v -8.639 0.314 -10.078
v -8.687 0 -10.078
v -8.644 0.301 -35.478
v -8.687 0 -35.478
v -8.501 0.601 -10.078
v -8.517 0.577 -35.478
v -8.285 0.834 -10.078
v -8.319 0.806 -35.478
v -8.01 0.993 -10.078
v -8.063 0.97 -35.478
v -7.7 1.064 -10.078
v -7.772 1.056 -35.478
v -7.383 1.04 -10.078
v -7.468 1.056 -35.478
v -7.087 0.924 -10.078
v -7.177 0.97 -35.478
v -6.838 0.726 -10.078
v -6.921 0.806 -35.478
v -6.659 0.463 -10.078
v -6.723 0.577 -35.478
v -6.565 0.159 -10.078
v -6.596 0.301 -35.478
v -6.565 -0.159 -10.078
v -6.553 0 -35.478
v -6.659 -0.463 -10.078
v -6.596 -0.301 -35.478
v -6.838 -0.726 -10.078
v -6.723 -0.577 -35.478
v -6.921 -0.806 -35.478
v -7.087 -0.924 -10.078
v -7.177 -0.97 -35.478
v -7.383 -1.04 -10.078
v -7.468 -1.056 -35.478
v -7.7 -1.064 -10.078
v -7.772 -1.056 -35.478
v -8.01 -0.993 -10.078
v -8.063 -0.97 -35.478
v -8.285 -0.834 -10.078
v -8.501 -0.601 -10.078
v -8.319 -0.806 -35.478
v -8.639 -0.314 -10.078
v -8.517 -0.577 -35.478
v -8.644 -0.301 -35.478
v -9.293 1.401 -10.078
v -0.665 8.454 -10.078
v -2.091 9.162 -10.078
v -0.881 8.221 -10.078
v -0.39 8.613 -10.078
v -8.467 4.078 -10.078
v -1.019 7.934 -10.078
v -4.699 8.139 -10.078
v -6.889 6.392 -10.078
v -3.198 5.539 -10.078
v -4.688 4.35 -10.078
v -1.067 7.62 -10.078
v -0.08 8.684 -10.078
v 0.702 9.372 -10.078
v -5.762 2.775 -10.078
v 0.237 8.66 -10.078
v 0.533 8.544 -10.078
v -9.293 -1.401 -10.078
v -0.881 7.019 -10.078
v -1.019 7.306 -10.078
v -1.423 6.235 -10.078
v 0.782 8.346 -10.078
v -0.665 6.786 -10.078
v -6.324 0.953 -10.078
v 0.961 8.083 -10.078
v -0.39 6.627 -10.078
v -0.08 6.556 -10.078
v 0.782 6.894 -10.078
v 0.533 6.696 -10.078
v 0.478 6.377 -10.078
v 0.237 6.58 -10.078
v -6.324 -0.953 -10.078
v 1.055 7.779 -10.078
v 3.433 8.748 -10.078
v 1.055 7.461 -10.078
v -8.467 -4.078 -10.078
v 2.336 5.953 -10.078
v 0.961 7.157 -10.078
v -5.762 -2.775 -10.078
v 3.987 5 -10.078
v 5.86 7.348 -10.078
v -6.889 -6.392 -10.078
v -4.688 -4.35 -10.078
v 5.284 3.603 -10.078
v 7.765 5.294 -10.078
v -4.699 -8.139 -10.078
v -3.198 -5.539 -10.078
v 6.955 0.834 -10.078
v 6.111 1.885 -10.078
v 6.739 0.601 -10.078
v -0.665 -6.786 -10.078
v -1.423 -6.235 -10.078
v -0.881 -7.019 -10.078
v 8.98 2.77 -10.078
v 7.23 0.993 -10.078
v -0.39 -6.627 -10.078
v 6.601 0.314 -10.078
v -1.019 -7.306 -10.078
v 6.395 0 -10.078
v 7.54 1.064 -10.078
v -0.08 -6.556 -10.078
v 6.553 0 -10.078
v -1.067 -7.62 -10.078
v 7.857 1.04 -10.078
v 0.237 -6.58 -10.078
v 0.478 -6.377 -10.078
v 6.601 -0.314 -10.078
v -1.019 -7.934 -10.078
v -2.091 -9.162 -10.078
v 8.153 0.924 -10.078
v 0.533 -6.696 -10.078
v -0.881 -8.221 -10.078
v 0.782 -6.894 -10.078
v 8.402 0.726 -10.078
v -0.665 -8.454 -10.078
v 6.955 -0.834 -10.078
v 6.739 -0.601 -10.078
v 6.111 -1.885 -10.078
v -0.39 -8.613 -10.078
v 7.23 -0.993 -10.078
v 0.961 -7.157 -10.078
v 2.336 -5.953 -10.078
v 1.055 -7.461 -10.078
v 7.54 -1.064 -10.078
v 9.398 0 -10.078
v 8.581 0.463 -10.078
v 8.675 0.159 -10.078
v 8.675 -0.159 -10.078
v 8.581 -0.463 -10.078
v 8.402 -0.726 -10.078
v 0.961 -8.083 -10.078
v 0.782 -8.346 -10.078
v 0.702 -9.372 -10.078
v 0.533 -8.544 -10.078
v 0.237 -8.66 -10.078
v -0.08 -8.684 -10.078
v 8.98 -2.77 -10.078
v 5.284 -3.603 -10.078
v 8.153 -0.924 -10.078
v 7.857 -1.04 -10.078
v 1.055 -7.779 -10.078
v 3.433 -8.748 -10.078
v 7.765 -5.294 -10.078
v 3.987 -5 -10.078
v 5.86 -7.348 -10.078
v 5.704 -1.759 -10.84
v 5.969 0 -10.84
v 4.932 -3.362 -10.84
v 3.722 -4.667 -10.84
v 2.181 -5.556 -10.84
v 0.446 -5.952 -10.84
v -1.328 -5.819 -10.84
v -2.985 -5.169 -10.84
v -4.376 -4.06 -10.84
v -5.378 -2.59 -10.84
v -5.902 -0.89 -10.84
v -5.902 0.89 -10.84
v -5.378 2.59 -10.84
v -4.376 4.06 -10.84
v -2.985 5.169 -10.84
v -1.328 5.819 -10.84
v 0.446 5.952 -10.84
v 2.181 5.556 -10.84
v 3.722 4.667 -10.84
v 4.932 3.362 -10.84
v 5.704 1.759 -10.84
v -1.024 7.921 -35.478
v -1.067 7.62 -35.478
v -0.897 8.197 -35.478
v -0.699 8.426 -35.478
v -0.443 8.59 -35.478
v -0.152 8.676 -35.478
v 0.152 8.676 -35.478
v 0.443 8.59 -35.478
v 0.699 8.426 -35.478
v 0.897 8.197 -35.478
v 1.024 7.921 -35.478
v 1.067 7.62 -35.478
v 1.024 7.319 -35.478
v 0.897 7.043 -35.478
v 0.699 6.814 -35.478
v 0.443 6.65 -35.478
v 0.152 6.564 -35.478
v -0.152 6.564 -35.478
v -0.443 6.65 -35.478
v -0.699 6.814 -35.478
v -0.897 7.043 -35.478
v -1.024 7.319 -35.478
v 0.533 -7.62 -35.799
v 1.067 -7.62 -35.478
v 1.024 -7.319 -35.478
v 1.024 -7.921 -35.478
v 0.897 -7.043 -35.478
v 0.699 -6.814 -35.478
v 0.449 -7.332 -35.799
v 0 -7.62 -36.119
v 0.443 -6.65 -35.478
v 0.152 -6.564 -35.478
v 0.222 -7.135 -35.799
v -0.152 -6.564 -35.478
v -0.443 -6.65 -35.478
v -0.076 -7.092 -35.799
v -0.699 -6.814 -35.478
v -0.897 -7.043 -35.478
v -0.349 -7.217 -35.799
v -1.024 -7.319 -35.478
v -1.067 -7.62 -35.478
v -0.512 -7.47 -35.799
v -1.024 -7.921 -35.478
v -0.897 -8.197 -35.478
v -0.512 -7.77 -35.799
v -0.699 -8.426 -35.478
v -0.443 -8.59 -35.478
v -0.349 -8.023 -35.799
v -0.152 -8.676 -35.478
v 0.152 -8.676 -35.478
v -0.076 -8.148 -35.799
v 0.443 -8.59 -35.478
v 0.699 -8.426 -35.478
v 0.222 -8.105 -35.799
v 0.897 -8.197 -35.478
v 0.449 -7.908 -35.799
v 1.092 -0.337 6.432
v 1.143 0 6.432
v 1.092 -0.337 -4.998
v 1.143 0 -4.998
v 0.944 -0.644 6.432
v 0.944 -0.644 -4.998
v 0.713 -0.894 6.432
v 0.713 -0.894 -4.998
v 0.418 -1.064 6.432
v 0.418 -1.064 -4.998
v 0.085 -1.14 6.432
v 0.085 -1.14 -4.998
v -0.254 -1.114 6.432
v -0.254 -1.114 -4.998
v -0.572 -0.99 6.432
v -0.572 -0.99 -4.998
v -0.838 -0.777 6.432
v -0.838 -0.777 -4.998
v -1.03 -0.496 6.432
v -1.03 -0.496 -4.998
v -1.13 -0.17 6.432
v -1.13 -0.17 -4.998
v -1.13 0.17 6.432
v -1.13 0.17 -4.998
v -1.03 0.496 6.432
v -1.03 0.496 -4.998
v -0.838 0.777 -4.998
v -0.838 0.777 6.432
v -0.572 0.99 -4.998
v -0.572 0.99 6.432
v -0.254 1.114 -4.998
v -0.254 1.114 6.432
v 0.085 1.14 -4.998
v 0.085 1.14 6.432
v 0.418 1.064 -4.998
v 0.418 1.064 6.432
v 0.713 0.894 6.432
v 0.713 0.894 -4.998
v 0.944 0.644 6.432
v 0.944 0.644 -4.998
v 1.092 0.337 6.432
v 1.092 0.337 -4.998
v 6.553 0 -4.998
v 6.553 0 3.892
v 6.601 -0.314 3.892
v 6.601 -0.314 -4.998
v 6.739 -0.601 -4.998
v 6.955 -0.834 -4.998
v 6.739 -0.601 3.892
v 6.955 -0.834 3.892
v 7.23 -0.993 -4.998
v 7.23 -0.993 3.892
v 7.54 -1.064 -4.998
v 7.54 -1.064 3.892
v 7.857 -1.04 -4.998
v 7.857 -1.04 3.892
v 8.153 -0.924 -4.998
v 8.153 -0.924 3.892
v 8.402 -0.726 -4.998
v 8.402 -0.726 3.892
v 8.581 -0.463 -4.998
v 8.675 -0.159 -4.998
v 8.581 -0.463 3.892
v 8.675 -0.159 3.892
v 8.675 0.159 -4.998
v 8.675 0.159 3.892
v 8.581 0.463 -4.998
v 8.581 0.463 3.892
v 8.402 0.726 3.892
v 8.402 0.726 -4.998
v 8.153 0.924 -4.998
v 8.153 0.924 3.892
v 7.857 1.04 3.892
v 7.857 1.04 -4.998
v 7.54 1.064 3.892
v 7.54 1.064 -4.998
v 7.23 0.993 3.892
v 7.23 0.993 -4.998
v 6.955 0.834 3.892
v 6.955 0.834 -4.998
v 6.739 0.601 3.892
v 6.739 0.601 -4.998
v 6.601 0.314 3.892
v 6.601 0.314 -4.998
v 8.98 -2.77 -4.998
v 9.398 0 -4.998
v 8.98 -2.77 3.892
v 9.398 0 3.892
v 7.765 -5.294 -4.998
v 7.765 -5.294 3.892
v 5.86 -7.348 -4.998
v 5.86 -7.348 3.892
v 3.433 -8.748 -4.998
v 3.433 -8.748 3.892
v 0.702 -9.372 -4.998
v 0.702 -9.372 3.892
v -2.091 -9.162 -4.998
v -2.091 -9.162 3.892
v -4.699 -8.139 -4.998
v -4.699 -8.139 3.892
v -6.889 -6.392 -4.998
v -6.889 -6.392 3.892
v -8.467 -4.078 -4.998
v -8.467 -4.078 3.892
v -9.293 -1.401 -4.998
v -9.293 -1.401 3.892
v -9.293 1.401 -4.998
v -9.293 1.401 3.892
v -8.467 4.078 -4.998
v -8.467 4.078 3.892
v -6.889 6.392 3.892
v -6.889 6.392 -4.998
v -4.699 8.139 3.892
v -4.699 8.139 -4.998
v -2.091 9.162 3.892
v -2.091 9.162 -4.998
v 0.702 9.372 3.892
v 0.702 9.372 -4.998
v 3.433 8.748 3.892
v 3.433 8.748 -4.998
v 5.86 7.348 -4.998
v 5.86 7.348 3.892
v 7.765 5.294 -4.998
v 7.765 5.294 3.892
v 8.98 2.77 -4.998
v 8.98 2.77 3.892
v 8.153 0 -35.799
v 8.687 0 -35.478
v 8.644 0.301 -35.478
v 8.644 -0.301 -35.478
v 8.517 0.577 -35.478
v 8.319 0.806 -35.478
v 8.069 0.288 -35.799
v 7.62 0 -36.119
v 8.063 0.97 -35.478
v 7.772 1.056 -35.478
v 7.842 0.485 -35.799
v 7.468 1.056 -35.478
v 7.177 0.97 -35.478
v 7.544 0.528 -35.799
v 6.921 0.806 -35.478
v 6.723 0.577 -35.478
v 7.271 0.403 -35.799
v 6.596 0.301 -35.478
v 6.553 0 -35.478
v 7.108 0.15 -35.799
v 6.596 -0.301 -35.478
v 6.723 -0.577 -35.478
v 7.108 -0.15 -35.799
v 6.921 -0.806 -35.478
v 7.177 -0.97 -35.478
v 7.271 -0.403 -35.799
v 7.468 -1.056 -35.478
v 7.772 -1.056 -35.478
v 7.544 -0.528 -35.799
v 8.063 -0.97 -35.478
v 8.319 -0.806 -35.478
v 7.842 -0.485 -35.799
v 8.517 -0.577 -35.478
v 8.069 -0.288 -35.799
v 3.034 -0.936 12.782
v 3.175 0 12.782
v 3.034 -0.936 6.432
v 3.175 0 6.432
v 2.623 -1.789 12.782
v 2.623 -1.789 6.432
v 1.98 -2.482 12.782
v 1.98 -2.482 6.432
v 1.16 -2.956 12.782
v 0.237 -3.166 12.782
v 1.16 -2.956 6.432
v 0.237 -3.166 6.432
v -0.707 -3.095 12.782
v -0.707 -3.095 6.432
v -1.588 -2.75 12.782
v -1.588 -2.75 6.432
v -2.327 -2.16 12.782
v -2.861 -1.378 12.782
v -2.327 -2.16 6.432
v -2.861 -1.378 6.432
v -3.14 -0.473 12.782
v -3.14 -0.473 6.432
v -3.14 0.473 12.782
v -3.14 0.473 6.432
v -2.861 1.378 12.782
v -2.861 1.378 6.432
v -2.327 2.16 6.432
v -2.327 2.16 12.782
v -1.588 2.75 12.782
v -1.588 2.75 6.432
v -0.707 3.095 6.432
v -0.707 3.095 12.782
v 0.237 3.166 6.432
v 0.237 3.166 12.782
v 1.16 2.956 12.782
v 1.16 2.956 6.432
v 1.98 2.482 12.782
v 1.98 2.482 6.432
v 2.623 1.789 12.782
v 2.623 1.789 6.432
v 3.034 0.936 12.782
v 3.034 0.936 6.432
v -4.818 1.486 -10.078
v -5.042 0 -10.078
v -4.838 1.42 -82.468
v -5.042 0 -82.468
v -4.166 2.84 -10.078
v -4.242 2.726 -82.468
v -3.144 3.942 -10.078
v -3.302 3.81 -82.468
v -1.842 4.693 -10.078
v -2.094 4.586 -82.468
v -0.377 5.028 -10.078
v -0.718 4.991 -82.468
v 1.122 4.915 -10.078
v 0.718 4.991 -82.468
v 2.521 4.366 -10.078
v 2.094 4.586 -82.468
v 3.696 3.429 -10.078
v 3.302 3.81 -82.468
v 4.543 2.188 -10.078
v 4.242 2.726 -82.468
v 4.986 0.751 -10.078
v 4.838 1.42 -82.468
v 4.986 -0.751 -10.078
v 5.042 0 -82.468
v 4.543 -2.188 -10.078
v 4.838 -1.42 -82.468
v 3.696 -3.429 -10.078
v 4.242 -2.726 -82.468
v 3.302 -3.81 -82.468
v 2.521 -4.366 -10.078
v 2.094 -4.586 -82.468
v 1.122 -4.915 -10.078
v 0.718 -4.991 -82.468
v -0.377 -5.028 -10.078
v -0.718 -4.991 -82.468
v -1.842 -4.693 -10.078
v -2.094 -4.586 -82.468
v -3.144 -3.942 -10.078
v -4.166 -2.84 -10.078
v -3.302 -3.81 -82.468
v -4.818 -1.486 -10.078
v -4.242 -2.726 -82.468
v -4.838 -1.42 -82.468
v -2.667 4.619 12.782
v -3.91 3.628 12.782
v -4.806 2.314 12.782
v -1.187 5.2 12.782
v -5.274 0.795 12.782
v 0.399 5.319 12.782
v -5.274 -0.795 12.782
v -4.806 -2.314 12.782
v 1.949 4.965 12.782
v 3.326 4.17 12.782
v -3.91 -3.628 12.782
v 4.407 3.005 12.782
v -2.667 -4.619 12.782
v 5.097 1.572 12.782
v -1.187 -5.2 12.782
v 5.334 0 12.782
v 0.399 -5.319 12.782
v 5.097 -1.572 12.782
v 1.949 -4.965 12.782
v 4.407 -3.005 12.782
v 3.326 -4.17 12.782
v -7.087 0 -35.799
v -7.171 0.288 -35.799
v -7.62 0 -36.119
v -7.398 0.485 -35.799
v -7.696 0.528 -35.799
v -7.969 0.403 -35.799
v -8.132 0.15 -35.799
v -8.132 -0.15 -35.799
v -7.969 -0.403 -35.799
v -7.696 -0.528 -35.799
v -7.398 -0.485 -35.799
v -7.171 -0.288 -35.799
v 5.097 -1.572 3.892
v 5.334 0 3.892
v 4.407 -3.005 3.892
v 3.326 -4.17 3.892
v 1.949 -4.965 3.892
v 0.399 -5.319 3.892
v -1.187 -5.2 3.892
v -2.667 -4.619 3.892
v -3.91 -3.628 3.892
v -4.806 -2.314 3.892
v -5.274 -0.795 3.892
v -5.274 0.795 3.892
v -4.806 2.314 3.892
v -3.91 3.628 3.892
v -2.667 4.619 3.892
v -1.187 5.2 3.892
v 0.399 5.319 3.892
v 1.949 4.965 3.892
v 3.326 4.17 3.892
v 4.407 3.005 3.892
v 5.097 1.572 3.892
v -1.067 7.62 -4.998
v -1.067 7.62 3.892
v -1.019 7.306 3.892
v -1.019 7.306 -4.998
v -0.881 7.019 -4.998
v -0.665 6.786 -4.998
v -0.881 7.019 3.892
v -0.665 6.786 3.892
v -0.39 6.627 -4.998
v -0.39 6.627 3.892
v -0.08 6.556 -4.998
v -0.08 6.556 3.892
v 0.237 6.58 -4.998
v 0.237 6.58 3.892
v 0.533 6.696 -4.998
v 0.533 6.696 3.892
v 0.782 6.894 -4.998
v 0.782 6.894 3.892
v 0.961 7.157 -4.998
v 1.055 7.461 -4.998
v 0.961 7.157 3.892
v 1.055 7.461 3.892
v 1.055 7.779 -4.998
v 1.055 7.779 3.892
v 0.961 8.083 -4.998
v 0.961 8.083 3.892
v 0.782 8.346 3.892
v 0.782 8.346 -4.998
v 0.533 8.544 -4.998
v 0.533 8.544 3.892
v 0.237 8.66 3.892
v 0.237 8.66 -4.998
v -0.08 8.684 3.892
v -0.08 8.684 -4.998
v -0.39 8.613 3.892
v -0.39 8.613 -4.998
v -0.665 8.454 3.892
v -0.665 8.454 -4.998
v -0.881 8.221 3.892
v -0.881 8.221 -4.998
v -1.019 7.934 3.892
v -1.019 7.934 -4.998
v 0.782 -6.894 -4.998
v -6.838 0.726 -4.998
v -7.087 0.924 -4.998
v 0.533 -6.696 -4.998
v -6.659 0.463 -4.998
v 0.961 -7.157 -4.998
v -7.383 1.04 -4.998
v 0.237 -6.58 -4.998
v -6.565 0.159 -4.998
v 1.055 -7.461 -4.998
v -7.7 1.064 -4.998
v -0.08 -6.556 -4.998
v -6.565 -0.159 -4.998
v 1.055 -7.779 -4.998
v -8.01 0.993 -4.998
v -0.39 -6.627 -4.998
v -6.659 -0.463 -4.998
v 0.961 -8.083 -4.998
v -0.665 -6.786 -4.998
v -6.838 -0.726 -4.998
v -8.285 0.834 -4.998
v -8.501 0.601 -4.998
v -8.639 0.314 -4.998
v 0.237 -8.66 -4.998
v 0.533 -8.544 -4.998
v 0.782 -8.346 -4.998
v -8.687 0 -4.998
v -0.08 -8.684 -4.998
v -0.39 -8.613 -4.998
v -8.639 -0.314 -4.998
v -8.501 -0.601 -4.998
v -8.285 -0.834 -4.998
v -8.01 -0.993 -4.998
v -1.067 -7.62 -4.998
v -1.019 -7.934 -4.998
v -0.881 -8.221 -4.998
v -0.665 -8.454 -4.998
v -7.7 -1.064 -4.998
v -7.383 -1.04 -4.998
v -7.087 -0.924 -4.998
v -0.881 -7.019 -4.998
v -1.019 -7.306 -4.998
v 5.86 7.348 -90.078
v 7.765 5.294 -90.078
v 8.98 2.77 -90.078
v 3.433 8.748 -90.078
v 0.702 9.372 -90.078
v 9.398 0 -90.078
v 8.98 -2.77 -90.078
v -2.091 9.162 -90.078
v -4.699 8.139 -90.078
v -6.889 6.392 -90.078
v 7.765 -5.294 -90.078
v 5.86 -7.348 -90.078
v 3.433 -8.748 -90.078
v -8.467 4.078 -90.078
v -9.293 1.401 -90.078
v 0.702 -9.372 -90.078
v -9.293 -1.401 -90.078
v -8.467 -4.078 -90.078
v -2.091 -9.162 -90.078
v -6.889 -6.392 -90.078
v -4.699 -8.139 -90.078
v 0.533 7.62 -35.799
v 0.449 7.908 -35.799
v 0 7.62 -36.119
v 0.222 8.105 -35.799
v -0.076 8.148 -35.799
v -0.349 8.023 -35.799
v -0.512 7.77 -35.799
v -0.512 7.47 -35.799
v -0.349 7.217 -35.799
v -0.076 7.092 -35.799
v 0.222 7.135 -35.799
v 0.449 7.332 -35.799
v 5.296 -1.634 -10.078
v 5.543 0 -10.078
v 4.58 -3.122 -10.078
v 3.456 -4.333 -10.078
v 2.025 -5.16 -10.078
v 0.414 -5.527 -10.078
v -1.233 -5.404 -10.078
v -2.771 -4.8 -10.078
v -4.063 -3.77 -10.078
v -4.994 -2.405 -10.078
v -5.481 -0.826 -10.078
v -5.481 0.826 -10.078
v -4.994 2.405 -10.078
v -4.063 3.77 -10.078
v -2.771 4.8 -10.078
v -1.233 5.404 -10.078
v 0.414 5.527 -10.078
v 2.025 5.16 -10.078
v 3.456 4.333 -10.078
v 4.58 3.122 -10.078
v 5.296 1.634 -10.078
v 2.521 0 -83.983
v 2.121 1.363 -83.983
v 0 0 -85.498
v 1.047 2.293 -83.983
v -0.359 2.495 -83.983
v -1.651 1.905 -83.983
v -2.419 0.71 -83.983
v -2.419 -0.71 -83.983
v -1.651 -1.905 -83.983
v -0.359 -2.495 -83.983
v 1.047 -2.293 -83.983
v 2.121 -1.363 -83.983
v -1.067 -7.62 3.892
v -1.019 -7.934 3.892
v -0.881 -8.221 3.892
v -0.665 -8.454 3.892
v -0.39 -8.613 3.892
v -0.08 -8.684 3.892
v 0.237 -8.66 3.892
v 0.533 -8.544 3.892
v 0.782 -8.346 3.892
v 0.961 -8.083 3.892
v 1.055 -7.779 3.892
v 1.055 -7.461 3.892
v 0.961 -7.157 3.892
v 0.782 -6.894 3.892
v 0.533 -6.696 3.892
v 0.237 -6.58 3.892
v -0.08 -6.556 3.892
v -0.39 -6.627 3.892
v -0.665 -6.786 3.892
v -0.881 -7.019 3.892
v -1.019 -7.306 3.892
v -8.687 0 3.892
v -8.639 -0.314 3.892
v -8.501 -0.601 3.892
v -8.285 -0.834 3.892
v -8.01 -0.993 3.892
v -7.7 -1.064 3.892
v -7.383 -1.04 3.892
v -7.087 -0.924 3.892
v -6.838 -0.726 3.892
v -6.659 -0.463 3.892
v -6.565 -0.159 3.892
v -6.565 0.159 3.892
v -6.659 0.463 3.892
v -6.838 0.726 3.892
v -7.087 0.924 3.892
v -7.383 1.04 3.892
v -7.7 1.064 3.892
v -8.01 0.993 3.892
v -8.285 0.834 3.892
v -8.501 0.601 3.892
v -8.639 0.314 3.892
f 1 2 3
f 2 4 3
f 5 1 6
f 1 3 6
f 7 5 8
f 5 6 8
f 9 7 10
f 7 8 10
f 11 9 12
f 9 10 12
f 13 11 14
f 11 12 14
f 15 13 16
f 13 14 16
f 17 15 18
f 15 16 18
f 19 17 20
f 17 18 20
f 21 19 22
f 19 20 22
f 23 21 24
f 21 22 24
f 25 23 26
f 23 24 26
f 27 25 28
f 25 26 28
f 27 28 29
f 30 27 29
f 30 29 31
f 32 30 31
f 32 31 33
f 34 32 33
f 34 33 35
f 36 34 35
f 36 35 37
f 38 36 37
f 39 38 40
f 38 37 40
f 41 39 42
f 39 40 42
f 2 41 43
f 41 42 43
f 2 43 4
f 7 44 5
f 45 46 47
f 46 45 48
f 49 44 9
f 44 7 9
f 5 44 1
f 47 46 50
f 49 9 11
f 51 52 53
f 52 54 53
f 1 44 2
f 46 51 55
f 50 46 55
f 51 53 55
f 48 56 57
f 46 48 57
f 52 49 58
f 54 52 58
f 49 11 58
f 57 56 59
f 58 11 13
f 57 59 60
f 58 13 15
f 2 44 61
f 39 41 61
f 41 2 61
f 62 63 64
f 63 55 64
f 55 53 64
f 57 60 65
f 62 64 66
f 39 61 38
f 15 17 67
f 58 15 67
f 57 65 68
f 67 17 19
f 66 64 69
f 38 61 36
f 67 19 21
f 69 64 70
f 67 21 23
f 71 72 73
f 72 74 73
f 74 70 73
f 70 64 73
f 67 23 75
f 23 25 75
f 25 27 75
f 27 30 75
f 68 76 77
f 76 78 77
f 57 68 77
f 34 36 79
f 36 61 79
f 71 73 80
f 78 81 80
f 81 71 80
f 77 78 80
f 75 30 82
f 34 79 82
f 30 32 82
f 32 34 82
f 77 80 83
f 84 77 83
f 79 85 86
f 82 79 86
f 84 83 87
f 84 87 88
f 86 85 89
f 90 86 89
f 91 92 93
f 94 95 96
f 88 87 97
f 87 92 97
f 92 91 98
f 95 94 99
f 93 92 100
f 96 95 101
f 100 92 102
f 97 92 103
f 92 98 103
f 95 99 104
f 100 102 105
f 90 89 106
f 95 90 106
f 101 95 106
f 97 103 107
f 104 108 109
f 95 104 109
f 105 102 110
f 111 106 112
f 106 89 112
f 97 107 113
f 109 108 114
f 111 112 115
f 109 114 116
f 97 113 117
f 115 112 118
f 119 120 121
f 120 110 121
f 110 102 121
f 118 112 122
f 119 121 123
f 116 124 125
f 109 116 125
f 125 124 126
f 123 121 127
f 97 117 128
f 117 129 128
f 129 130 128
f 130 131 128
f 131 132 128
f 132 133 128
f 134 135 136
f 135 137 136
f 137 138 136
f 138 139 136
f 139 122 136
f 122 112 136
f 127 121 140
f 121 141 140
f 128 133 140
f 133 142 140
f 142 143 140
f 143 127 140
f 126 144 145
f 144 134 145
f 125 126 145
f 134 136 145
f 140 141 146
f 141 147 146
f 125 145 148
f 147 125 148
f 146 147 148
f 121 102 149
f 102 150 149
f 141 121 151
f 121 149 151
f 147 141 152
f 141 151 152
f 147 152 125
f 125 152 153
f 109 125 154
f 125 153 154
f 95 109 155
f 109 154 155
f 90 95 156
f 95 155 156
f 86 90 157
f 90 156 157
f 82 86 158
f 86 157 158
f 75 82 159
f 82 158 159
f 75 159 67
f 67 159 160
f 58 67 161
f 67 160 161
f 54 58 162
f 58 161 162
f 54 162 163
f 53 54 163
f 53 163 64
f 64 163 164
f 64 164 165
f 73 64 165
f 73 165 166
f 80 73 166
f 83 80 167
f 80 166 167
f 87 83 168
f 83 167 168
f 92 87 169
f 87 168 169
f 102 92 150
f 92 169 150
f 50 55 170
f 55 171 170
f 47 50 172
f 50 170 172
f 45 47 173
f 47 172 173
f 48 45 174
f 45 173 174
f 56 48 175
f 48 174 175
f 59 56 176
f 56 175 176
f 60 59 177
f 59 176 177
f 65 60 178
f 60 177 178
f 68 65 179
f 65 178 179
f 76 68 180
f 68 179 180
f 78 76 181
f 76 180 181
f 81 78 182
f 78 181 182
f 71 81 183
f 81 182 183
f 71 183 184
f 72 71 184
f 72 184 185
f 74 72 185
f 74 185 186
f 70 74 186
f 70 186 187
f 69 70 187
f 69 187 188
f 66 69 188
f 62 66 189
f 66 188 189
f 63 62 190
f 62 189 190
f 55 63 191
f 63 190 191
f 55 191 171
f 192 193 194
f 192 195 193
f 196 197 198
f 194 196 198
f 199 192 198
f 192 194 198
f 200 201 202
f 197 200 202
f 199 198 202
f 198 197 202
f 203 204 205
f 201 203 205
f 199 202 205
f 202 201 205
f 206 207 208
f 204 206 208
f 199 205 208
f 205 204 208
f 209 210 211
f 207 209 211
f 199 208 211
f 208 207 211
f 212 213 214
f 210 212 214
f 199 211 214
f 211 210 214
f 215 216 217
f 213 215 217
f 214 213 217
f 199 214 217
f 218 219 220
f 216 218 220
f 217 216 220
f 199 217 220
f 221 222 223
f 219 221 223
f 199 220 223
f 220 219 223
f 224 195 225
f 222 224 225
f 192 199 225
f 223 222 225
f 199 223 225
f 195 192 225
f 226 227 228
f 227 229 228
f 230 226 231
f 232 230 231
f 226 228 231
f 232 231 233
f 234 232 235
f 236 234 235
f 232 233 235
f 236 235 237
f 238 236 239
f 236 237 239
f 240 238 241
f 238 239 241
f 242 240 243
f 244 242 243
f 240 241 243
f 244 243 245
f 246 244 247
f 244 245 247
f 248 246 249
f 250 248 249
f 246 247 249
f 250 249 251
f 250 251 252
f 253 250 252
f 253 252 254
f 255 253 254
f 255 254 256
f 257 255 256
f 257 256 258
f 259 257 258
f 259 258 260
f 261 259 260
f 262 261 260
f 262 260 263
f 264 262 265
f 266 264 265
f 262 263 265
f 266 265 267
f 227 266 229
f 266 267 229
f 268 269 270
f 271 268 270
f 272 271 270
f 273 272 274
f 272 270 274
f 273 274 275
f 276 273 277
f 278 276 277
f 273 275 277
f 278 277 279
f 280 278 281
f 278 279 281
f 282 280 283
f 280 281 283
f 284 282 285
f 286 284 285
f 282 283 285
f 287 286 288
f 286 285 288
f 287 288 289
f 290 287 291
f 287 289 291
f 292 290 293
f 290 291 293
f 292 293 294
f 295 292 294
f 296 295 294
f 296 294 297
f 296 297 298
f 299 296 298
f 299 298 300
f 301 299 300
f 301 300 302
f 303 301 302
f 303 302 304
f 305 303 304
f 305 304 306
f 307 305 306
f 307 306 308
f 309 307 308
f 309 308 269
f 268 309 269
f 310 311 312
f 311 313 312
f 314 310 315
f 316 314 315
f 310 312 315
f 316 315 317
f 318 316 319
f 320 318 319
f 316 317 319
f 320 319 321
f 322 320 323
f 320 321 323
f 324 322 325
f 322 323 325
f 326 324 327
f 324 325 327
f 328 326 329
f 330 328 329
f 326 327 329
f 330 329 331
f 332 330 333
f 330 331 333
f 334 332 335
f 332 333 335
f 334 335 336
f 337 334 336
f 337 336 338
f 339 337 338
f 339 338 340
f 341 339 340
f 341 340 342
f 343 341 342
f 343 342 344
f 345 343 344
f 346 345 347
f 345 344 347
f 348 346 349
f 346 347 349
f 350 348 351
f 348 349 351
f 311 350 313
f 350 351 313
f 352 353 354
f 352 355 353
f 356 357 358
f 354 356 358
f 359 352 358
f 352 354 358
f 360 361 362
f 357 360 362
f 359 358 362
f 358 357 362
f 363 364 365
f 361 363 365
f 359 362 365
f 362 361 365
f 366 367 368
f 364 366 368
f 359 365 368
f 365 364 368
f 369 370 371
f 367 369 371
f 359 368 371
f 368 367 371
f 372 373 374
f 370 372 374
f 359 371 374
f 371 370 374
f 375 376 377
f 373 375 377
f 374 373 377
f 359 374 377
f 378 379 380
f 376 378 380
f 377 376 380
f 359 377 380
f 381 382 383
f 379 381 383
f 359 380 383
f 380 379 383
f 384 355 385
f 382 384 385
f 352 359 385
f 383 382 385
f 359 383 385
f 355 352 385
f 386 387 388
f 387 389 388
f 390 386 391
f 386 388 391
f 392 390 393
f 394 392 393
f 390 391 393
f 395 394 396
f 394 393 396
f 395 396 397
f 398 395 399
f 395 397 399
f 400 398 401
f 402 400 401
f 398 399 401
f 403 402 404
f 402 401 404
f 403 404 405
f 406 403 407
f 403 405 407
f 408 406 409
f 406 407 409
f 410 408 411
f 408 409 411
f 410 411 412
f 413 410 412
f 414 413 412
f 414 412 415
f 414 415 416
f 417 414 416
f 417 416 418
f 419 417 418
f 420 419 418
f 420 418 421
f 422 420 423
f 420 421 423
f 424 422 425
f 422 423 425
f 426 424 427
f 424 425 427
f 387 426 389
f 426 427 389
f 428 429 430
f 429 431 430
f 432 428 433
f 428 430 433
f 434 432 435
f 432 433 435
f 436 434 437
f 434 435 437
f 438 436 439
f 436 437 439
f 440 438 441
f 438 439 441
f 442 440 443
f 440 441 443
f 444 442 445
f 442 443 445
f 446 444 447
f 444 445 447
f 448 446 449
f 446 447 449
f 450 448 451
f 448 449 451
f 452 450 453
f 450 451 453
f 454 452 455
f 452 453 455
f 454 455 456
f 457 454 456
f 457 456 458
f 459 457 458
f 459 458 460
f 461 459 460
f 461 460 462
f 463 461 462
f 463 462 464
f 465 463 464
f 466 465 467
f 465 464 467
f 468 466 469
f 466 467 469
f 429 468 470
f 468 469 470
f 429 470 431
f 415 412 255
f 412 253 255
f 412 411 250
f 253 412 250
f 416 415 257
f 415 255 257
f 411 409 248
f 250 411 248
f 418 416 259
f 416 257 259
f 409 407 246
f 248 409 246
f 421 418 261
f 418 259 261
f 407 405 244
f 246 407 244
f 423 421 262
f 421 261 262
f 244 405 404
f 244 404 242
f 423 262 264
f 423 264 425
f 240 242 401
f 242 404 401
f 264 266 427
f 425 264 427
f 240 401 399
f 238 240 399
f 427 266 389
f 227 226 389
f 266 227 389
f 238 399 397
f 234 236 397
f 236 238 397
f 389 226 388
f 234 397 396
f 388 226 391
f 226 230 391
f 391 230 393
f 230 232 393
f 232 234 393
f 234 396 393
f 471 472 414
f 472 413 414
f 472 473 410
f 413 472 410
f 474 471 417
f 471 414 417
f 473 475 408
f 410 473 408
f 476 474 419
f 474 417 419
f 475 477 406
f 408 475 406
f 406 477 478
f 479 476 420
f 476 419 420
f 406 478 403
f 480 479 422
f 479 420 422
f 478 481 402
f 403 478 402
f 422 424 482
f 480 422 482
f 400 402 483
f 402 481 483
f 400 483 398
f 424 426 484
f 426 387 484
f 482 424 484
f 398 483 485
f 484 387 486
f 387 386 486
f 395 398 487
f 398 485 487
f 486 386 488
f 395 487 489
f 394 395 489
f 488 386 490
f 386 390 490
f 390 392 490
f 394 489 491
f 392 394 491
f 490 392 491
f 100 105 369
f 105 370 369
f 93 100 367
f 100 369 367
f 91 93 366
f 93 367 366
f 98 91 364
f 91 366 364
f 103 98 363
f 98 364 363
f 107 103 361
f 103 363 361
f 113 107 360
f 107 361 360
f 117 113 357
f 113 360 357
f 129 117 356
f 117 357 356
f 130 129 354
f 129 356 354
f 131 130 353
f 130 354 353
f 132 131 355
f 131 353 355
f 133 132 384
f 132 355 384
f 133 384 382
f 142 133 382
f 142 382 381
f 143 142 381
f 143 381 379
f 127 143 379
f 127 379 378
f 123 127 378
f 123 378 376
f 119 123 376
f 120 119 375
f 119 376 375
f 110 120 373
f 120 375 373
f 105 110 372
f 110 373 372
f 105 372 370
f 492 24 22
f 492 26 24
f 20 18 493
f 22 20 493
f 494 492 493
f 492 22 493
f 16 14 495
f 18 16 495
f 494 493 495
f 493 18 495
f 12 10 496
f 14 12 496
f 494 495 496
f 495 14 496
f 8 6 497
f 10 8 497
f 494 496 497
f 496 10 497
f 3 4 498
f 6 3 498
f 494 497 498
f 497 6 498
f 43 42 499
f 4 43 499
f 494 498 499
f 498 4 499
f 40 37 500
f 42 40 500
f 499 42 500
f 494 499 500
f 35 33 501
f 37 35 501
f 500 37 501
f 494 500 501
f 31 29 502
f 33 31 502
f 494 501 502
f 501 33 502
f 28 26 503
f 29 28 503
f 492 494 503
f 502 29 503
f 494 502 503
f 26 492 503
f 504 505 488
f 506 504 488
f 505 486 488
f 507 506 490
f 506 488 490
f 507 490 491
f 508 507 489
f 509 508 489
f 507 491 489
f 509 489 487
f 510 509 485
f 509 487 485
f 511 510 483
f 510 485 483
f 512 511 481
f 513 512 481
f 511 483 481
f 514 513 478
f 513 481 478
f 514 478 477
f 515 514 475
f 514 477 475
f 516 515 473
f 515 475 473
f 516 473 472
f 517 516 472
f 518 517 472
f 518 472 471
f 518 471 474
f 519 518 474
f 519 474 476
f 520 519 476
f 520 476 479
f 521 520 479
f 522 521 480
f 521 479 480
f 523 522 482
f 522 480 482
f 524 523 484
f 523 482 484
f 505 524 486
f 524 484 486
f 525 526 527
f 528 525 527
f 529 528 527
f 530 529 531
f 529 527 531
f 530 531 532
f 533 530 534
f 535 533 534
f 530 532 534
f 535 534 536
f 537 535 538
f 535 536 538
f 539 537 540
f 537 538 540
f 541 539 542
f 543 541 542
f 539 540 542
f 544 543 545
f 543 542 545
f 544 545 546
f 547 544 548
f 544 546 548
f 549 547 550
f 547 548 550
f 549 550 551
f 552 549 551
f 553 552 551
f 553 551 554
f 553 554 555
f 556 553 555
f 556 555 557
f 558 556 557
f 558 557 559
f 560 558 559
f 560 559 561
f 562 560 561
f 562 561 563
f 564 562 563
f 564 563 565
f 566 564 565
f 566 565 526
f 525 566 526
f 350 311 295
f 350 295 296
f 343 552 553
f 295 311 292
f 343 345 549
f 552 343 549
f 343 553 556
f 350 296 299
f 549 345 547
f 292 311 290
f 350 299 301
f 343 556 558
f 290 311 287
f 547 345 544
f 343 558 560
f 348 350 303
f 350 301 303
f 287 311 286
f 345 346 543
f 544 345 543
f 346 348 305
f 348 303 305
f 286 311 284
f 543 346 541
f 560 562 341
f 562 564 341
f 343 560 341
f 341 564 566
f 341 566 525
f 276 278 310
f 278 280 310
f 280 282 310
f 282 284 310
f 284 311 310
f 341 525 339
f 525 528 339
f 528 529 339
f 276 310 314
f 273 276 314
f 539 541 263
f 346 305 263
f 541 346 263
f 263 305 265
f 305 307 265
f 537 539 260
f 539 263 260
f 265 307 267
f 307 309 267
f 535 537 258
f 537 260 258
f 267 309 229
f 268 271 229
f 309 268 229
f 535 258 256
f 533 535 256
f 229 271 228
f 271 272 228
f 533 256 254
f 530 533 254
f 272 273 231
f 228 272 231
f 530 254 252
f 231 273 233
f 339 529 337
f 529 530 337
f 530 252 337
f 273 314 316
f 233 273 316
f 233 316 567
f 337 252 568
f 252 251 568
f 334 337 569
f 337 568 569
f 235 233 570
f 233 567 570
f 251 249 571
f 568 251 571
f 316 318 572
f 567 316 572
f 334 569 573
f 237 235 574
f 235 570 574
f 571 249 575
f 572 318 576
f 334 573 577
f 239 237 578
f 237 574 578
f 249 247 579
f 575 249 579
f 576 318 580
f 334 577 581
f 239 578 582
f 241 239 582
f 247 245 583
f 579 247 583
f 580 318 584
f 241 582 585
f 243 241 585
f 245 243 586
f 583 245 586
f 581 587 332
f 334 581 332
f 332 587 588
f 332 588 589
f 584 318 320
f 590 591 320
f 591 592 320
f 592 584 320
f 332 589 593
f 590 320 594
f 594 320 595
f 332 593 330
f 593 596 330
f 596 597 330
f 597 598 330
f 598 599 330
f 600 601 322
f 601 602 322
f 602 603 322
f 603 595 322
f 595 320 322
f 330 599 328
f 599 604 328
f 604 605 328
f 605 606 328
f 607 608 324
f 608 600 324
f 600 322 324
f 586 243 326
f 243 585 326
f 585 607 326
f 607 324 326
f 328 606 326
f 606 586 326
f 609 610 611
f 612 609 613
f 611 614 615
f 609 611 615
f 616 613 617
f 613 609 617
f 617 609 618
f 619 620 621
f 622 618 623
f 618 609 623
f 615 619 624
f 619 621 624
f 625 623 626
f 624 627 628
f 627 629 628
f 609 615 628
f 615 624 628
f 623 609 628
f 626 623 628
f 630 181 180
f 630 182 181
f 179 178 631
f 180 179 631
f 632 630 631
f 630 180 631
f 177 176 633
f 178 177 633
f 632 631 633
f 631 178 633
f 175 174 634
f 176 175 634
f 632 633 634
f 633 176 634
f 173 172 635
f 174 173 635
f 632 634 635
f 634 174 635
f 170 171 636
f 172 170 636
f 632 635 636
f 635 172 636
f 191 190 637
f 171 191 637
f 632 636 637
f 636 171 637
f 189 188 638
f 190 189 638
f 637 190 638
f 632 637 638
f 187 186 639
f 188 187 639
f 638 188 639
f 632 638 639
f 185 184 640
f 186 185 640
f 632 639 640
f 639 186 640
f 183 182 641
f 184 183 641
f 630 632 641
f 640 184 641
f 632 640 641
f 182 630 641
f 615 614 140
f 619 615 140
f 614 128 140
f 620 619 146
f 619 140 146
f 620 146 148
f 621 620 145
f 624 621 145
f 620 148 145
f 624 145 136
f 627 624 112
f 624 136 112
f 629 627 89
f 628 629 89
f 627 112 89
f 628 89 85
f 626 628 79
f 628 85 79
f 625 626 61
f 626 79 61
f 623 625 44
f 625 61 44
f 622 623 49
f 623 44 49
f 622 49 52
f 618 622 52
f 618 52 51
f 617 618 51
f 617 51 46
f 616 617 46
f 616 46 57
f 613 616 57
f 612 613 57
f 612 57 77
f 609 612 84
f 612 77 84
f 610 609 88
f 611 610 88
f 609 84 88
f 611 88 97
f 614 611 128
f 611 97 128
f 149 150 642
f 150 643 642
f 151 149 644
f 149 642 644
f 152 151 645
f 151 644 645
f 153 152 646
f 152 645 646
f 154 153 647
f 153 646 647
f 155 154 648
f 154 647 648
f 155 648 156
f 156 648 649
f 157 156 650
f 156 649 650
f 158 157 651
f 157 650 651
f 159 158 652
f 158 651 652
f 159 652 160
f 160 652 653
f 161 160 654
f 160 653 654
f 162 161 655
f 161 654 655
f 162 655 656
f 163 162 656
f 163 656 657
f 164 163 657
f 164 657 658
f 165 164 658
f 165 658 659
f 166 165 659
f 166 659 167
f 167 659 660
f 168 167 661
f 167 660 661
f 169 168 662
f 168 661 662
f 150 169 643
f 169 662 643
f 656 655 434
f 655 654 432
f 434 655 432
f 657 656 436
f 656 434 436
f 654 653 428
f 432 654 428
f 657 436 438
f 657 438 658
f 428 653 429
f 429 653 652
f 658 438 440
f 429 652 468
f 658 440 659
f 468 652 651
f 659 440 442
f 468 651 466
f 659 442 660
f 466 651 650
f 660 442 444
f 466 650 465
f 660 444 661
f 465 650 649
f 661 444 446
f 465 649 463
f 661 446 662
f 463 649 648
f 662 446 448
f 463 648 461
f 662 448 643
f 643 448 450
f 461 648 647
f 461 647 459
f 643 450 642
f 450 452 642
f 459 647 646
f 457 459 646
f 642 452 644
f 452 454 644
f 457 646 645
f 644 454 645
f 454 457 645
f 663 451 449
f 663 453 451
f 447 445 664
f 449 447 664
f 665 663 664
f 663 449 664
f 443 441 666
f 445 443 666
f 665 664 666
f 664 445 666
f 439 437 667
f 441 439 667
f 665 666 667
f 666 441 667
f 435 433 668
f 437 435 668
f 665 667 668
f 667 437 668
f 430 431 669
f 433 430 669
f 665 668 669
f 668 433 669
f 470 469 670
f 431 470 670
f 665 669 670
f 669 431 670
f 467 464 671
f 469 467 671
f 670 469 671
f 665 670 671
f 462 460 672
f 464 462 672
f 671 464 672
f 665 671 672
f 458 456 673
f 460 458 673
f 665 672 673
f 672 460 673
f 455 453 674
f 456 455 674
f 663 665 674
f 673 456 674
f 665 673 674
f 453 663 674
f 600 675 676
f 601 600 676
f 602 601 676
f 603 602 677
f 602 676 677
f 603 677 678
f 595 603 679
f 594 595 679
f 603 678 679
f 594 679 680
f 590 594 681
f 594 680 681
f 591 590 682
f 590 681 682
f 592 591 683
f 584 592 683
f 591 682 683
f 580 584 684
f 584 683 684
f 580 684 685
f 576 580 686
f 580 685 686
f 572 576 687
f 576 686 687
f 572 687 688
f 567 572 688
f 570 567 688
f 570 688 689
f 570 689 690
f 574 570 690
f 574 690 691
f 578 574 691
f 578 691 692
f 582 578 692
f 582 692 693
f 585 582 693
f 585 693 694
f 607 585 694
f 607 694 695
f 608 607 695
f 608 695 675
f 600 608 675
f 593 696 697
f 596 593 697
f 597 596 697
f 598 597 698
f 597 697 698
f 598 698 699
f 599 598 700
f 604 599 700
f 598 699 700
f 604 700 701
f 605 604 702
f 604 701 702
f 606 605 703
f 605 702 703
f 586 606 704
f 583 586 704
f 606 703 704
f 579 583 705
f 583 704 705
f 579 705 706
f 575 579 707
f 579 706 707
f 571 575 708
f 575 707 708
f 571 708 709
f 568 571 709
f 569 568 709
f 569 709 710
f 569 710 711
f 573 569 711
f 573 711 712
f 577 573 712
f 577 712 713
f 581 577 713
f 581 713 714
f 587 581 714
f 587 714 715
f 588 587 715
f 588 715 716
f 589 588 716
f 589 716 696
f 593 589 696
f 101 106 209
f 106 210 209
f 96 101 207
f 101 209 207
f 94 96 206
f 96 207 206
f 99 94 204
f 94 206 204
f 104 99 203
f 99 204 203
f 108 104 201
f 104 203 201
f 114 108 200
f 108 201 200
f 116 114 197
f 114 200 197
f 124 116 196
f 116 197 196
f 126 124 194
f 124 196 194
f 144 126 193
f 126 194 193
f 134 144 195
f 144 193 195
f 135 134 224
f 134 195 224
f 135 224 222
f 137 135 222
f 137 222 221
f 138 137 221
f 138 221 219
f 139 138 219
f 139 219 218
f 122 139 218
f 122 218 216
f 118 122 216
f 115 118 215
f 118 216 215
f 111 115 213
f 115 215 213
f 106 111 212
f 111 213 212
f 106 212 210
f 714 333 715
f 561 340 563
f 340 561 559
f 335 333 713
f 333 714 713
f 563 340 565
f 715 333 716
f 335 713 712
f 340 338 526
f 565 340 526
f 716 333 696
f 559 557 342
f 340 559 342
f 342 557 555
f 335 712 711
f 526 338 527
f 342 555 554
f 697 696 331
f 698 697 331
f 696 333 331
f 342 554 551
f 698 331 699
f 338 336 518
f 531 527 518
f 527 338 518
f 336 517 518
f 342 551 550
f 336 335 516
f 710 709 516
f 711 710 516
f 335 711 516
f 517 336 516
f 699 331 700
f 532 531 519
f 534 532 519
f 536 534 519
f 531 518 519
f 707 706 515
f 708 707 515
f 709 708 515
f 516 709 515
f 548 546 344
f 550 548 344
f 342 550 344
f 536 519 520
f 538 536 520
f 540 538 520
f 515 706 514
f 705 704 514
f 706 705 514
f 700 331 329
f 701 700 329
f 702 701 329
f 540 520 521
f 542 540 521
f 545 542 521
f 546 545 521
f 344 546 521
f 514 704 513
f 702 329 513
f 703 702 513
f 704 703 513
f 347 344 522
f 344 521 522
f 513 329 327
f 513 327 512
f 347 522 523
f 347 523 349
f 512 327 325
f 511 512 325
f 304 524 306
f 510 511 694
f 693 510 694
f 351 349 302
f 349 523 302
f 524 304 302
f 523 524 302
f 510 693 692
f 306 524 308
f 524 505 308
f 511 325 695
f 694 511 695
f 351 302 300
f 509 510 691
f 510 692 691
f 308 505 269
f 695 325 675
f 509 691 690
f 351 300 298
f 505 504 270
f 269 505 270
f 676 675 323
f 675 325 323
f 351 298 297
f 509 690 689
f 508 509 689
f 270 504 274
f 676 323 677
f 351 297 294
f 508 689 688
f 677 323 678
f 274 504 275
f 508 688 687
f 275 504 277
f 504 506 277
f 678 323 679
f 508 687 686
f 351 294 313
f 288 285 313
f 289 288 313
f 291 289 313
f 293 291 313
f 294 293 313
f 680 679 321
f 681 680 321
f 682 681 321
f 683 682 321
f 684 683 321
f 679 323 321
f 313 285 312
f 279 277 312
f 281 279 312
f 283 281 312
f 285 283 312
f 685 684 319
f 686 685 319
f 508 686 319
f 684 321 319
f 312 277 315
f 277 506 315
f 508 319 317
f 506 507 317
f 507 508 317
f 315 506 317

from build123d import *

# Parameters (mm, degrees)
F1_W     = 5.08
F1_H     = 80
F4_D     = 2.1336
F4_DEPTH = 25.4
F4_TIP   = 0.6409981084
F5_D     = 2.1336
F6_D     = 10.0838
F6_DEPTH = 72.39
F6_TIP   = 3.0294791551


# Not quite as in the source:
# - a feature names something its author has since deleted; it is built from what else it names


with BuildPart() as f2:
    # F1 (on Front) → F2 (revolve)
    with BuildSketch(Plane.XZ):
        Polygon((9.398, -90.0780827382), (9.398, -10.0780827382), (6.3953505707, -10.0780827382), (5.969, -10.8400827382), (5.5426494293, -10.0780827382), (5.08, -10.0780827382), (5.08, -90.0780827382), align=None)
        with Locations((2.54, -50.0780827382)):
            Rectangle(F1_W, F1_H)
    revolve(axis=Axis((0, 0, -0.125199824), (0, 0, -1)))

    # F4
    with Locations(Plane.XY.offset(-10.0780827382)):
        with Locations((-7.62, 0), (0, 7.62), (7.62, 0), (0, -7.62)):
            Hole(F4_D / 2, depth=F4_DEPTH)
            with Locations((0, 0, -(F4_DEPTH + F4_TIP / 2))):  # 118° drill point
                Cone(0, F4_D / 2, F4_TIP, mode=Mode.SUBTRACT)

    # F6
    with Locations(Plane.XY.offset(-10.0780827382)):
        with Locations((0, 0)):
            Hole(F6_D / 2, depth=F6_DEPTH)
            with Locations((0, 0, -(F6_DEPTH + F6_TIP / 2))):  # 118° drill point
                Cone(0, F6_D / 2, F6_TIP, mode=Mode.SUBTRACT)


with BuildPart() as f2b:
    # F1 (on Front) → F2, piece 2 (revolve)
    with BuildSketch(Plane.XZ):
        Polygon((5.334, 3.8919172618), (5.334, 12.7819172618), (3.175, 12.7819172618), (3.175, 6.4319172618), (1.143, 6.4319172618), (1.143, -4.9980827382), (9.398, -4.9980827382), (9.398, 3.8919172618), align=None)
    revolve(axis=Axis((0, 0, -0.125199824), (0, 0, -1)))

    # F5 (through all)
    with Locations(Plane(origin=(0, 0, -10.0780827382), x_dir=(1, 0, 0), z_dir=(0, 0, -1))):
        with Locations((0, 7.62), (7.62, 0), (0, -7.62), (-7.62, 0)):
            Hole(F5_D / 2)


solid = Compound([f2.part, f2b.part])
